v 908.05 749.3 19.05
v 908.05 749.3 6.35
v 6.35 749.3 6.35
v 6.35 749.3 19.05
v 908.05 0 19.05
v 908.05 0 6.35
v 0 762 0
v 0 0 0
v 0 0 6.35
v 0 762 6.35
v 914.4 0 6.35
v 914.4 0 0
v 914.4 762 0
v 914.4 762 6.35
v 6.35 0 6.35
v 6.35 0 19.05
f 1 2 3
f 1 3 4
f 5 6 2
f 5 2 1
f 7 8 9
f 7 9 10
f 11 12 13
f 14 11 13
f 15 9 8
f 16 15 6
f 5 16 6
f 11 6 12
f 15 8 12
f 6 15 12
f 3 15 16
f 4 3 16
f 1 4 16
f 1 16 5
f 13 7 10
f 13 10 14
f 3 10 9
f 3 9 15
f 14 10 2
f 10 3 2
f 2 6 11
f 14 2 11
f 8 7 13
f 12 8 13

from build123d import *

# Parameters (mm, degrees)
F0_W     = 914.4
F0_H     = 762
F1_DEPTH = 19.05
F2_W     = 6.35
F2_H     = 12.7
F3_DEPTH = 762.001
F4_W     = 12.7
F4_H     = 12.7
F5_DEPTH = 914.401


with BuildPart() as f1:
    # F0 (on Top) → F1 (new body)
    with BuildSketch(Plane.XY):
        with Locations((457.2, 381)):
            Rectangle(F0_W, F0_H)
    extrude(amount=F1_DEPTH)

    # F2 (on face) → F3 (cut, through all)
    with BuildSketch(Plane.XZ):
        with Locations((3.175, 12.7)):
            Rectangle(F2_W, F2_H)
        with Locations((911.225, 12.7)):
            Rectangle(F2_W, F2_H)
    extrude(amount=-F3_DEPTH, mode=Mode.SUBTRACT)

    # F4 (on face) → F5 (cut, through all)
    with BuildSketch(Plane.YZ.offset(914.4)):
        with Locations((755.65, 12.7)):
            Rectangle(F4_W, F4_H)
    extrude(amount=-F5_DEPTH, mode=Mode.SUBTRACT)


solid = f1.part
